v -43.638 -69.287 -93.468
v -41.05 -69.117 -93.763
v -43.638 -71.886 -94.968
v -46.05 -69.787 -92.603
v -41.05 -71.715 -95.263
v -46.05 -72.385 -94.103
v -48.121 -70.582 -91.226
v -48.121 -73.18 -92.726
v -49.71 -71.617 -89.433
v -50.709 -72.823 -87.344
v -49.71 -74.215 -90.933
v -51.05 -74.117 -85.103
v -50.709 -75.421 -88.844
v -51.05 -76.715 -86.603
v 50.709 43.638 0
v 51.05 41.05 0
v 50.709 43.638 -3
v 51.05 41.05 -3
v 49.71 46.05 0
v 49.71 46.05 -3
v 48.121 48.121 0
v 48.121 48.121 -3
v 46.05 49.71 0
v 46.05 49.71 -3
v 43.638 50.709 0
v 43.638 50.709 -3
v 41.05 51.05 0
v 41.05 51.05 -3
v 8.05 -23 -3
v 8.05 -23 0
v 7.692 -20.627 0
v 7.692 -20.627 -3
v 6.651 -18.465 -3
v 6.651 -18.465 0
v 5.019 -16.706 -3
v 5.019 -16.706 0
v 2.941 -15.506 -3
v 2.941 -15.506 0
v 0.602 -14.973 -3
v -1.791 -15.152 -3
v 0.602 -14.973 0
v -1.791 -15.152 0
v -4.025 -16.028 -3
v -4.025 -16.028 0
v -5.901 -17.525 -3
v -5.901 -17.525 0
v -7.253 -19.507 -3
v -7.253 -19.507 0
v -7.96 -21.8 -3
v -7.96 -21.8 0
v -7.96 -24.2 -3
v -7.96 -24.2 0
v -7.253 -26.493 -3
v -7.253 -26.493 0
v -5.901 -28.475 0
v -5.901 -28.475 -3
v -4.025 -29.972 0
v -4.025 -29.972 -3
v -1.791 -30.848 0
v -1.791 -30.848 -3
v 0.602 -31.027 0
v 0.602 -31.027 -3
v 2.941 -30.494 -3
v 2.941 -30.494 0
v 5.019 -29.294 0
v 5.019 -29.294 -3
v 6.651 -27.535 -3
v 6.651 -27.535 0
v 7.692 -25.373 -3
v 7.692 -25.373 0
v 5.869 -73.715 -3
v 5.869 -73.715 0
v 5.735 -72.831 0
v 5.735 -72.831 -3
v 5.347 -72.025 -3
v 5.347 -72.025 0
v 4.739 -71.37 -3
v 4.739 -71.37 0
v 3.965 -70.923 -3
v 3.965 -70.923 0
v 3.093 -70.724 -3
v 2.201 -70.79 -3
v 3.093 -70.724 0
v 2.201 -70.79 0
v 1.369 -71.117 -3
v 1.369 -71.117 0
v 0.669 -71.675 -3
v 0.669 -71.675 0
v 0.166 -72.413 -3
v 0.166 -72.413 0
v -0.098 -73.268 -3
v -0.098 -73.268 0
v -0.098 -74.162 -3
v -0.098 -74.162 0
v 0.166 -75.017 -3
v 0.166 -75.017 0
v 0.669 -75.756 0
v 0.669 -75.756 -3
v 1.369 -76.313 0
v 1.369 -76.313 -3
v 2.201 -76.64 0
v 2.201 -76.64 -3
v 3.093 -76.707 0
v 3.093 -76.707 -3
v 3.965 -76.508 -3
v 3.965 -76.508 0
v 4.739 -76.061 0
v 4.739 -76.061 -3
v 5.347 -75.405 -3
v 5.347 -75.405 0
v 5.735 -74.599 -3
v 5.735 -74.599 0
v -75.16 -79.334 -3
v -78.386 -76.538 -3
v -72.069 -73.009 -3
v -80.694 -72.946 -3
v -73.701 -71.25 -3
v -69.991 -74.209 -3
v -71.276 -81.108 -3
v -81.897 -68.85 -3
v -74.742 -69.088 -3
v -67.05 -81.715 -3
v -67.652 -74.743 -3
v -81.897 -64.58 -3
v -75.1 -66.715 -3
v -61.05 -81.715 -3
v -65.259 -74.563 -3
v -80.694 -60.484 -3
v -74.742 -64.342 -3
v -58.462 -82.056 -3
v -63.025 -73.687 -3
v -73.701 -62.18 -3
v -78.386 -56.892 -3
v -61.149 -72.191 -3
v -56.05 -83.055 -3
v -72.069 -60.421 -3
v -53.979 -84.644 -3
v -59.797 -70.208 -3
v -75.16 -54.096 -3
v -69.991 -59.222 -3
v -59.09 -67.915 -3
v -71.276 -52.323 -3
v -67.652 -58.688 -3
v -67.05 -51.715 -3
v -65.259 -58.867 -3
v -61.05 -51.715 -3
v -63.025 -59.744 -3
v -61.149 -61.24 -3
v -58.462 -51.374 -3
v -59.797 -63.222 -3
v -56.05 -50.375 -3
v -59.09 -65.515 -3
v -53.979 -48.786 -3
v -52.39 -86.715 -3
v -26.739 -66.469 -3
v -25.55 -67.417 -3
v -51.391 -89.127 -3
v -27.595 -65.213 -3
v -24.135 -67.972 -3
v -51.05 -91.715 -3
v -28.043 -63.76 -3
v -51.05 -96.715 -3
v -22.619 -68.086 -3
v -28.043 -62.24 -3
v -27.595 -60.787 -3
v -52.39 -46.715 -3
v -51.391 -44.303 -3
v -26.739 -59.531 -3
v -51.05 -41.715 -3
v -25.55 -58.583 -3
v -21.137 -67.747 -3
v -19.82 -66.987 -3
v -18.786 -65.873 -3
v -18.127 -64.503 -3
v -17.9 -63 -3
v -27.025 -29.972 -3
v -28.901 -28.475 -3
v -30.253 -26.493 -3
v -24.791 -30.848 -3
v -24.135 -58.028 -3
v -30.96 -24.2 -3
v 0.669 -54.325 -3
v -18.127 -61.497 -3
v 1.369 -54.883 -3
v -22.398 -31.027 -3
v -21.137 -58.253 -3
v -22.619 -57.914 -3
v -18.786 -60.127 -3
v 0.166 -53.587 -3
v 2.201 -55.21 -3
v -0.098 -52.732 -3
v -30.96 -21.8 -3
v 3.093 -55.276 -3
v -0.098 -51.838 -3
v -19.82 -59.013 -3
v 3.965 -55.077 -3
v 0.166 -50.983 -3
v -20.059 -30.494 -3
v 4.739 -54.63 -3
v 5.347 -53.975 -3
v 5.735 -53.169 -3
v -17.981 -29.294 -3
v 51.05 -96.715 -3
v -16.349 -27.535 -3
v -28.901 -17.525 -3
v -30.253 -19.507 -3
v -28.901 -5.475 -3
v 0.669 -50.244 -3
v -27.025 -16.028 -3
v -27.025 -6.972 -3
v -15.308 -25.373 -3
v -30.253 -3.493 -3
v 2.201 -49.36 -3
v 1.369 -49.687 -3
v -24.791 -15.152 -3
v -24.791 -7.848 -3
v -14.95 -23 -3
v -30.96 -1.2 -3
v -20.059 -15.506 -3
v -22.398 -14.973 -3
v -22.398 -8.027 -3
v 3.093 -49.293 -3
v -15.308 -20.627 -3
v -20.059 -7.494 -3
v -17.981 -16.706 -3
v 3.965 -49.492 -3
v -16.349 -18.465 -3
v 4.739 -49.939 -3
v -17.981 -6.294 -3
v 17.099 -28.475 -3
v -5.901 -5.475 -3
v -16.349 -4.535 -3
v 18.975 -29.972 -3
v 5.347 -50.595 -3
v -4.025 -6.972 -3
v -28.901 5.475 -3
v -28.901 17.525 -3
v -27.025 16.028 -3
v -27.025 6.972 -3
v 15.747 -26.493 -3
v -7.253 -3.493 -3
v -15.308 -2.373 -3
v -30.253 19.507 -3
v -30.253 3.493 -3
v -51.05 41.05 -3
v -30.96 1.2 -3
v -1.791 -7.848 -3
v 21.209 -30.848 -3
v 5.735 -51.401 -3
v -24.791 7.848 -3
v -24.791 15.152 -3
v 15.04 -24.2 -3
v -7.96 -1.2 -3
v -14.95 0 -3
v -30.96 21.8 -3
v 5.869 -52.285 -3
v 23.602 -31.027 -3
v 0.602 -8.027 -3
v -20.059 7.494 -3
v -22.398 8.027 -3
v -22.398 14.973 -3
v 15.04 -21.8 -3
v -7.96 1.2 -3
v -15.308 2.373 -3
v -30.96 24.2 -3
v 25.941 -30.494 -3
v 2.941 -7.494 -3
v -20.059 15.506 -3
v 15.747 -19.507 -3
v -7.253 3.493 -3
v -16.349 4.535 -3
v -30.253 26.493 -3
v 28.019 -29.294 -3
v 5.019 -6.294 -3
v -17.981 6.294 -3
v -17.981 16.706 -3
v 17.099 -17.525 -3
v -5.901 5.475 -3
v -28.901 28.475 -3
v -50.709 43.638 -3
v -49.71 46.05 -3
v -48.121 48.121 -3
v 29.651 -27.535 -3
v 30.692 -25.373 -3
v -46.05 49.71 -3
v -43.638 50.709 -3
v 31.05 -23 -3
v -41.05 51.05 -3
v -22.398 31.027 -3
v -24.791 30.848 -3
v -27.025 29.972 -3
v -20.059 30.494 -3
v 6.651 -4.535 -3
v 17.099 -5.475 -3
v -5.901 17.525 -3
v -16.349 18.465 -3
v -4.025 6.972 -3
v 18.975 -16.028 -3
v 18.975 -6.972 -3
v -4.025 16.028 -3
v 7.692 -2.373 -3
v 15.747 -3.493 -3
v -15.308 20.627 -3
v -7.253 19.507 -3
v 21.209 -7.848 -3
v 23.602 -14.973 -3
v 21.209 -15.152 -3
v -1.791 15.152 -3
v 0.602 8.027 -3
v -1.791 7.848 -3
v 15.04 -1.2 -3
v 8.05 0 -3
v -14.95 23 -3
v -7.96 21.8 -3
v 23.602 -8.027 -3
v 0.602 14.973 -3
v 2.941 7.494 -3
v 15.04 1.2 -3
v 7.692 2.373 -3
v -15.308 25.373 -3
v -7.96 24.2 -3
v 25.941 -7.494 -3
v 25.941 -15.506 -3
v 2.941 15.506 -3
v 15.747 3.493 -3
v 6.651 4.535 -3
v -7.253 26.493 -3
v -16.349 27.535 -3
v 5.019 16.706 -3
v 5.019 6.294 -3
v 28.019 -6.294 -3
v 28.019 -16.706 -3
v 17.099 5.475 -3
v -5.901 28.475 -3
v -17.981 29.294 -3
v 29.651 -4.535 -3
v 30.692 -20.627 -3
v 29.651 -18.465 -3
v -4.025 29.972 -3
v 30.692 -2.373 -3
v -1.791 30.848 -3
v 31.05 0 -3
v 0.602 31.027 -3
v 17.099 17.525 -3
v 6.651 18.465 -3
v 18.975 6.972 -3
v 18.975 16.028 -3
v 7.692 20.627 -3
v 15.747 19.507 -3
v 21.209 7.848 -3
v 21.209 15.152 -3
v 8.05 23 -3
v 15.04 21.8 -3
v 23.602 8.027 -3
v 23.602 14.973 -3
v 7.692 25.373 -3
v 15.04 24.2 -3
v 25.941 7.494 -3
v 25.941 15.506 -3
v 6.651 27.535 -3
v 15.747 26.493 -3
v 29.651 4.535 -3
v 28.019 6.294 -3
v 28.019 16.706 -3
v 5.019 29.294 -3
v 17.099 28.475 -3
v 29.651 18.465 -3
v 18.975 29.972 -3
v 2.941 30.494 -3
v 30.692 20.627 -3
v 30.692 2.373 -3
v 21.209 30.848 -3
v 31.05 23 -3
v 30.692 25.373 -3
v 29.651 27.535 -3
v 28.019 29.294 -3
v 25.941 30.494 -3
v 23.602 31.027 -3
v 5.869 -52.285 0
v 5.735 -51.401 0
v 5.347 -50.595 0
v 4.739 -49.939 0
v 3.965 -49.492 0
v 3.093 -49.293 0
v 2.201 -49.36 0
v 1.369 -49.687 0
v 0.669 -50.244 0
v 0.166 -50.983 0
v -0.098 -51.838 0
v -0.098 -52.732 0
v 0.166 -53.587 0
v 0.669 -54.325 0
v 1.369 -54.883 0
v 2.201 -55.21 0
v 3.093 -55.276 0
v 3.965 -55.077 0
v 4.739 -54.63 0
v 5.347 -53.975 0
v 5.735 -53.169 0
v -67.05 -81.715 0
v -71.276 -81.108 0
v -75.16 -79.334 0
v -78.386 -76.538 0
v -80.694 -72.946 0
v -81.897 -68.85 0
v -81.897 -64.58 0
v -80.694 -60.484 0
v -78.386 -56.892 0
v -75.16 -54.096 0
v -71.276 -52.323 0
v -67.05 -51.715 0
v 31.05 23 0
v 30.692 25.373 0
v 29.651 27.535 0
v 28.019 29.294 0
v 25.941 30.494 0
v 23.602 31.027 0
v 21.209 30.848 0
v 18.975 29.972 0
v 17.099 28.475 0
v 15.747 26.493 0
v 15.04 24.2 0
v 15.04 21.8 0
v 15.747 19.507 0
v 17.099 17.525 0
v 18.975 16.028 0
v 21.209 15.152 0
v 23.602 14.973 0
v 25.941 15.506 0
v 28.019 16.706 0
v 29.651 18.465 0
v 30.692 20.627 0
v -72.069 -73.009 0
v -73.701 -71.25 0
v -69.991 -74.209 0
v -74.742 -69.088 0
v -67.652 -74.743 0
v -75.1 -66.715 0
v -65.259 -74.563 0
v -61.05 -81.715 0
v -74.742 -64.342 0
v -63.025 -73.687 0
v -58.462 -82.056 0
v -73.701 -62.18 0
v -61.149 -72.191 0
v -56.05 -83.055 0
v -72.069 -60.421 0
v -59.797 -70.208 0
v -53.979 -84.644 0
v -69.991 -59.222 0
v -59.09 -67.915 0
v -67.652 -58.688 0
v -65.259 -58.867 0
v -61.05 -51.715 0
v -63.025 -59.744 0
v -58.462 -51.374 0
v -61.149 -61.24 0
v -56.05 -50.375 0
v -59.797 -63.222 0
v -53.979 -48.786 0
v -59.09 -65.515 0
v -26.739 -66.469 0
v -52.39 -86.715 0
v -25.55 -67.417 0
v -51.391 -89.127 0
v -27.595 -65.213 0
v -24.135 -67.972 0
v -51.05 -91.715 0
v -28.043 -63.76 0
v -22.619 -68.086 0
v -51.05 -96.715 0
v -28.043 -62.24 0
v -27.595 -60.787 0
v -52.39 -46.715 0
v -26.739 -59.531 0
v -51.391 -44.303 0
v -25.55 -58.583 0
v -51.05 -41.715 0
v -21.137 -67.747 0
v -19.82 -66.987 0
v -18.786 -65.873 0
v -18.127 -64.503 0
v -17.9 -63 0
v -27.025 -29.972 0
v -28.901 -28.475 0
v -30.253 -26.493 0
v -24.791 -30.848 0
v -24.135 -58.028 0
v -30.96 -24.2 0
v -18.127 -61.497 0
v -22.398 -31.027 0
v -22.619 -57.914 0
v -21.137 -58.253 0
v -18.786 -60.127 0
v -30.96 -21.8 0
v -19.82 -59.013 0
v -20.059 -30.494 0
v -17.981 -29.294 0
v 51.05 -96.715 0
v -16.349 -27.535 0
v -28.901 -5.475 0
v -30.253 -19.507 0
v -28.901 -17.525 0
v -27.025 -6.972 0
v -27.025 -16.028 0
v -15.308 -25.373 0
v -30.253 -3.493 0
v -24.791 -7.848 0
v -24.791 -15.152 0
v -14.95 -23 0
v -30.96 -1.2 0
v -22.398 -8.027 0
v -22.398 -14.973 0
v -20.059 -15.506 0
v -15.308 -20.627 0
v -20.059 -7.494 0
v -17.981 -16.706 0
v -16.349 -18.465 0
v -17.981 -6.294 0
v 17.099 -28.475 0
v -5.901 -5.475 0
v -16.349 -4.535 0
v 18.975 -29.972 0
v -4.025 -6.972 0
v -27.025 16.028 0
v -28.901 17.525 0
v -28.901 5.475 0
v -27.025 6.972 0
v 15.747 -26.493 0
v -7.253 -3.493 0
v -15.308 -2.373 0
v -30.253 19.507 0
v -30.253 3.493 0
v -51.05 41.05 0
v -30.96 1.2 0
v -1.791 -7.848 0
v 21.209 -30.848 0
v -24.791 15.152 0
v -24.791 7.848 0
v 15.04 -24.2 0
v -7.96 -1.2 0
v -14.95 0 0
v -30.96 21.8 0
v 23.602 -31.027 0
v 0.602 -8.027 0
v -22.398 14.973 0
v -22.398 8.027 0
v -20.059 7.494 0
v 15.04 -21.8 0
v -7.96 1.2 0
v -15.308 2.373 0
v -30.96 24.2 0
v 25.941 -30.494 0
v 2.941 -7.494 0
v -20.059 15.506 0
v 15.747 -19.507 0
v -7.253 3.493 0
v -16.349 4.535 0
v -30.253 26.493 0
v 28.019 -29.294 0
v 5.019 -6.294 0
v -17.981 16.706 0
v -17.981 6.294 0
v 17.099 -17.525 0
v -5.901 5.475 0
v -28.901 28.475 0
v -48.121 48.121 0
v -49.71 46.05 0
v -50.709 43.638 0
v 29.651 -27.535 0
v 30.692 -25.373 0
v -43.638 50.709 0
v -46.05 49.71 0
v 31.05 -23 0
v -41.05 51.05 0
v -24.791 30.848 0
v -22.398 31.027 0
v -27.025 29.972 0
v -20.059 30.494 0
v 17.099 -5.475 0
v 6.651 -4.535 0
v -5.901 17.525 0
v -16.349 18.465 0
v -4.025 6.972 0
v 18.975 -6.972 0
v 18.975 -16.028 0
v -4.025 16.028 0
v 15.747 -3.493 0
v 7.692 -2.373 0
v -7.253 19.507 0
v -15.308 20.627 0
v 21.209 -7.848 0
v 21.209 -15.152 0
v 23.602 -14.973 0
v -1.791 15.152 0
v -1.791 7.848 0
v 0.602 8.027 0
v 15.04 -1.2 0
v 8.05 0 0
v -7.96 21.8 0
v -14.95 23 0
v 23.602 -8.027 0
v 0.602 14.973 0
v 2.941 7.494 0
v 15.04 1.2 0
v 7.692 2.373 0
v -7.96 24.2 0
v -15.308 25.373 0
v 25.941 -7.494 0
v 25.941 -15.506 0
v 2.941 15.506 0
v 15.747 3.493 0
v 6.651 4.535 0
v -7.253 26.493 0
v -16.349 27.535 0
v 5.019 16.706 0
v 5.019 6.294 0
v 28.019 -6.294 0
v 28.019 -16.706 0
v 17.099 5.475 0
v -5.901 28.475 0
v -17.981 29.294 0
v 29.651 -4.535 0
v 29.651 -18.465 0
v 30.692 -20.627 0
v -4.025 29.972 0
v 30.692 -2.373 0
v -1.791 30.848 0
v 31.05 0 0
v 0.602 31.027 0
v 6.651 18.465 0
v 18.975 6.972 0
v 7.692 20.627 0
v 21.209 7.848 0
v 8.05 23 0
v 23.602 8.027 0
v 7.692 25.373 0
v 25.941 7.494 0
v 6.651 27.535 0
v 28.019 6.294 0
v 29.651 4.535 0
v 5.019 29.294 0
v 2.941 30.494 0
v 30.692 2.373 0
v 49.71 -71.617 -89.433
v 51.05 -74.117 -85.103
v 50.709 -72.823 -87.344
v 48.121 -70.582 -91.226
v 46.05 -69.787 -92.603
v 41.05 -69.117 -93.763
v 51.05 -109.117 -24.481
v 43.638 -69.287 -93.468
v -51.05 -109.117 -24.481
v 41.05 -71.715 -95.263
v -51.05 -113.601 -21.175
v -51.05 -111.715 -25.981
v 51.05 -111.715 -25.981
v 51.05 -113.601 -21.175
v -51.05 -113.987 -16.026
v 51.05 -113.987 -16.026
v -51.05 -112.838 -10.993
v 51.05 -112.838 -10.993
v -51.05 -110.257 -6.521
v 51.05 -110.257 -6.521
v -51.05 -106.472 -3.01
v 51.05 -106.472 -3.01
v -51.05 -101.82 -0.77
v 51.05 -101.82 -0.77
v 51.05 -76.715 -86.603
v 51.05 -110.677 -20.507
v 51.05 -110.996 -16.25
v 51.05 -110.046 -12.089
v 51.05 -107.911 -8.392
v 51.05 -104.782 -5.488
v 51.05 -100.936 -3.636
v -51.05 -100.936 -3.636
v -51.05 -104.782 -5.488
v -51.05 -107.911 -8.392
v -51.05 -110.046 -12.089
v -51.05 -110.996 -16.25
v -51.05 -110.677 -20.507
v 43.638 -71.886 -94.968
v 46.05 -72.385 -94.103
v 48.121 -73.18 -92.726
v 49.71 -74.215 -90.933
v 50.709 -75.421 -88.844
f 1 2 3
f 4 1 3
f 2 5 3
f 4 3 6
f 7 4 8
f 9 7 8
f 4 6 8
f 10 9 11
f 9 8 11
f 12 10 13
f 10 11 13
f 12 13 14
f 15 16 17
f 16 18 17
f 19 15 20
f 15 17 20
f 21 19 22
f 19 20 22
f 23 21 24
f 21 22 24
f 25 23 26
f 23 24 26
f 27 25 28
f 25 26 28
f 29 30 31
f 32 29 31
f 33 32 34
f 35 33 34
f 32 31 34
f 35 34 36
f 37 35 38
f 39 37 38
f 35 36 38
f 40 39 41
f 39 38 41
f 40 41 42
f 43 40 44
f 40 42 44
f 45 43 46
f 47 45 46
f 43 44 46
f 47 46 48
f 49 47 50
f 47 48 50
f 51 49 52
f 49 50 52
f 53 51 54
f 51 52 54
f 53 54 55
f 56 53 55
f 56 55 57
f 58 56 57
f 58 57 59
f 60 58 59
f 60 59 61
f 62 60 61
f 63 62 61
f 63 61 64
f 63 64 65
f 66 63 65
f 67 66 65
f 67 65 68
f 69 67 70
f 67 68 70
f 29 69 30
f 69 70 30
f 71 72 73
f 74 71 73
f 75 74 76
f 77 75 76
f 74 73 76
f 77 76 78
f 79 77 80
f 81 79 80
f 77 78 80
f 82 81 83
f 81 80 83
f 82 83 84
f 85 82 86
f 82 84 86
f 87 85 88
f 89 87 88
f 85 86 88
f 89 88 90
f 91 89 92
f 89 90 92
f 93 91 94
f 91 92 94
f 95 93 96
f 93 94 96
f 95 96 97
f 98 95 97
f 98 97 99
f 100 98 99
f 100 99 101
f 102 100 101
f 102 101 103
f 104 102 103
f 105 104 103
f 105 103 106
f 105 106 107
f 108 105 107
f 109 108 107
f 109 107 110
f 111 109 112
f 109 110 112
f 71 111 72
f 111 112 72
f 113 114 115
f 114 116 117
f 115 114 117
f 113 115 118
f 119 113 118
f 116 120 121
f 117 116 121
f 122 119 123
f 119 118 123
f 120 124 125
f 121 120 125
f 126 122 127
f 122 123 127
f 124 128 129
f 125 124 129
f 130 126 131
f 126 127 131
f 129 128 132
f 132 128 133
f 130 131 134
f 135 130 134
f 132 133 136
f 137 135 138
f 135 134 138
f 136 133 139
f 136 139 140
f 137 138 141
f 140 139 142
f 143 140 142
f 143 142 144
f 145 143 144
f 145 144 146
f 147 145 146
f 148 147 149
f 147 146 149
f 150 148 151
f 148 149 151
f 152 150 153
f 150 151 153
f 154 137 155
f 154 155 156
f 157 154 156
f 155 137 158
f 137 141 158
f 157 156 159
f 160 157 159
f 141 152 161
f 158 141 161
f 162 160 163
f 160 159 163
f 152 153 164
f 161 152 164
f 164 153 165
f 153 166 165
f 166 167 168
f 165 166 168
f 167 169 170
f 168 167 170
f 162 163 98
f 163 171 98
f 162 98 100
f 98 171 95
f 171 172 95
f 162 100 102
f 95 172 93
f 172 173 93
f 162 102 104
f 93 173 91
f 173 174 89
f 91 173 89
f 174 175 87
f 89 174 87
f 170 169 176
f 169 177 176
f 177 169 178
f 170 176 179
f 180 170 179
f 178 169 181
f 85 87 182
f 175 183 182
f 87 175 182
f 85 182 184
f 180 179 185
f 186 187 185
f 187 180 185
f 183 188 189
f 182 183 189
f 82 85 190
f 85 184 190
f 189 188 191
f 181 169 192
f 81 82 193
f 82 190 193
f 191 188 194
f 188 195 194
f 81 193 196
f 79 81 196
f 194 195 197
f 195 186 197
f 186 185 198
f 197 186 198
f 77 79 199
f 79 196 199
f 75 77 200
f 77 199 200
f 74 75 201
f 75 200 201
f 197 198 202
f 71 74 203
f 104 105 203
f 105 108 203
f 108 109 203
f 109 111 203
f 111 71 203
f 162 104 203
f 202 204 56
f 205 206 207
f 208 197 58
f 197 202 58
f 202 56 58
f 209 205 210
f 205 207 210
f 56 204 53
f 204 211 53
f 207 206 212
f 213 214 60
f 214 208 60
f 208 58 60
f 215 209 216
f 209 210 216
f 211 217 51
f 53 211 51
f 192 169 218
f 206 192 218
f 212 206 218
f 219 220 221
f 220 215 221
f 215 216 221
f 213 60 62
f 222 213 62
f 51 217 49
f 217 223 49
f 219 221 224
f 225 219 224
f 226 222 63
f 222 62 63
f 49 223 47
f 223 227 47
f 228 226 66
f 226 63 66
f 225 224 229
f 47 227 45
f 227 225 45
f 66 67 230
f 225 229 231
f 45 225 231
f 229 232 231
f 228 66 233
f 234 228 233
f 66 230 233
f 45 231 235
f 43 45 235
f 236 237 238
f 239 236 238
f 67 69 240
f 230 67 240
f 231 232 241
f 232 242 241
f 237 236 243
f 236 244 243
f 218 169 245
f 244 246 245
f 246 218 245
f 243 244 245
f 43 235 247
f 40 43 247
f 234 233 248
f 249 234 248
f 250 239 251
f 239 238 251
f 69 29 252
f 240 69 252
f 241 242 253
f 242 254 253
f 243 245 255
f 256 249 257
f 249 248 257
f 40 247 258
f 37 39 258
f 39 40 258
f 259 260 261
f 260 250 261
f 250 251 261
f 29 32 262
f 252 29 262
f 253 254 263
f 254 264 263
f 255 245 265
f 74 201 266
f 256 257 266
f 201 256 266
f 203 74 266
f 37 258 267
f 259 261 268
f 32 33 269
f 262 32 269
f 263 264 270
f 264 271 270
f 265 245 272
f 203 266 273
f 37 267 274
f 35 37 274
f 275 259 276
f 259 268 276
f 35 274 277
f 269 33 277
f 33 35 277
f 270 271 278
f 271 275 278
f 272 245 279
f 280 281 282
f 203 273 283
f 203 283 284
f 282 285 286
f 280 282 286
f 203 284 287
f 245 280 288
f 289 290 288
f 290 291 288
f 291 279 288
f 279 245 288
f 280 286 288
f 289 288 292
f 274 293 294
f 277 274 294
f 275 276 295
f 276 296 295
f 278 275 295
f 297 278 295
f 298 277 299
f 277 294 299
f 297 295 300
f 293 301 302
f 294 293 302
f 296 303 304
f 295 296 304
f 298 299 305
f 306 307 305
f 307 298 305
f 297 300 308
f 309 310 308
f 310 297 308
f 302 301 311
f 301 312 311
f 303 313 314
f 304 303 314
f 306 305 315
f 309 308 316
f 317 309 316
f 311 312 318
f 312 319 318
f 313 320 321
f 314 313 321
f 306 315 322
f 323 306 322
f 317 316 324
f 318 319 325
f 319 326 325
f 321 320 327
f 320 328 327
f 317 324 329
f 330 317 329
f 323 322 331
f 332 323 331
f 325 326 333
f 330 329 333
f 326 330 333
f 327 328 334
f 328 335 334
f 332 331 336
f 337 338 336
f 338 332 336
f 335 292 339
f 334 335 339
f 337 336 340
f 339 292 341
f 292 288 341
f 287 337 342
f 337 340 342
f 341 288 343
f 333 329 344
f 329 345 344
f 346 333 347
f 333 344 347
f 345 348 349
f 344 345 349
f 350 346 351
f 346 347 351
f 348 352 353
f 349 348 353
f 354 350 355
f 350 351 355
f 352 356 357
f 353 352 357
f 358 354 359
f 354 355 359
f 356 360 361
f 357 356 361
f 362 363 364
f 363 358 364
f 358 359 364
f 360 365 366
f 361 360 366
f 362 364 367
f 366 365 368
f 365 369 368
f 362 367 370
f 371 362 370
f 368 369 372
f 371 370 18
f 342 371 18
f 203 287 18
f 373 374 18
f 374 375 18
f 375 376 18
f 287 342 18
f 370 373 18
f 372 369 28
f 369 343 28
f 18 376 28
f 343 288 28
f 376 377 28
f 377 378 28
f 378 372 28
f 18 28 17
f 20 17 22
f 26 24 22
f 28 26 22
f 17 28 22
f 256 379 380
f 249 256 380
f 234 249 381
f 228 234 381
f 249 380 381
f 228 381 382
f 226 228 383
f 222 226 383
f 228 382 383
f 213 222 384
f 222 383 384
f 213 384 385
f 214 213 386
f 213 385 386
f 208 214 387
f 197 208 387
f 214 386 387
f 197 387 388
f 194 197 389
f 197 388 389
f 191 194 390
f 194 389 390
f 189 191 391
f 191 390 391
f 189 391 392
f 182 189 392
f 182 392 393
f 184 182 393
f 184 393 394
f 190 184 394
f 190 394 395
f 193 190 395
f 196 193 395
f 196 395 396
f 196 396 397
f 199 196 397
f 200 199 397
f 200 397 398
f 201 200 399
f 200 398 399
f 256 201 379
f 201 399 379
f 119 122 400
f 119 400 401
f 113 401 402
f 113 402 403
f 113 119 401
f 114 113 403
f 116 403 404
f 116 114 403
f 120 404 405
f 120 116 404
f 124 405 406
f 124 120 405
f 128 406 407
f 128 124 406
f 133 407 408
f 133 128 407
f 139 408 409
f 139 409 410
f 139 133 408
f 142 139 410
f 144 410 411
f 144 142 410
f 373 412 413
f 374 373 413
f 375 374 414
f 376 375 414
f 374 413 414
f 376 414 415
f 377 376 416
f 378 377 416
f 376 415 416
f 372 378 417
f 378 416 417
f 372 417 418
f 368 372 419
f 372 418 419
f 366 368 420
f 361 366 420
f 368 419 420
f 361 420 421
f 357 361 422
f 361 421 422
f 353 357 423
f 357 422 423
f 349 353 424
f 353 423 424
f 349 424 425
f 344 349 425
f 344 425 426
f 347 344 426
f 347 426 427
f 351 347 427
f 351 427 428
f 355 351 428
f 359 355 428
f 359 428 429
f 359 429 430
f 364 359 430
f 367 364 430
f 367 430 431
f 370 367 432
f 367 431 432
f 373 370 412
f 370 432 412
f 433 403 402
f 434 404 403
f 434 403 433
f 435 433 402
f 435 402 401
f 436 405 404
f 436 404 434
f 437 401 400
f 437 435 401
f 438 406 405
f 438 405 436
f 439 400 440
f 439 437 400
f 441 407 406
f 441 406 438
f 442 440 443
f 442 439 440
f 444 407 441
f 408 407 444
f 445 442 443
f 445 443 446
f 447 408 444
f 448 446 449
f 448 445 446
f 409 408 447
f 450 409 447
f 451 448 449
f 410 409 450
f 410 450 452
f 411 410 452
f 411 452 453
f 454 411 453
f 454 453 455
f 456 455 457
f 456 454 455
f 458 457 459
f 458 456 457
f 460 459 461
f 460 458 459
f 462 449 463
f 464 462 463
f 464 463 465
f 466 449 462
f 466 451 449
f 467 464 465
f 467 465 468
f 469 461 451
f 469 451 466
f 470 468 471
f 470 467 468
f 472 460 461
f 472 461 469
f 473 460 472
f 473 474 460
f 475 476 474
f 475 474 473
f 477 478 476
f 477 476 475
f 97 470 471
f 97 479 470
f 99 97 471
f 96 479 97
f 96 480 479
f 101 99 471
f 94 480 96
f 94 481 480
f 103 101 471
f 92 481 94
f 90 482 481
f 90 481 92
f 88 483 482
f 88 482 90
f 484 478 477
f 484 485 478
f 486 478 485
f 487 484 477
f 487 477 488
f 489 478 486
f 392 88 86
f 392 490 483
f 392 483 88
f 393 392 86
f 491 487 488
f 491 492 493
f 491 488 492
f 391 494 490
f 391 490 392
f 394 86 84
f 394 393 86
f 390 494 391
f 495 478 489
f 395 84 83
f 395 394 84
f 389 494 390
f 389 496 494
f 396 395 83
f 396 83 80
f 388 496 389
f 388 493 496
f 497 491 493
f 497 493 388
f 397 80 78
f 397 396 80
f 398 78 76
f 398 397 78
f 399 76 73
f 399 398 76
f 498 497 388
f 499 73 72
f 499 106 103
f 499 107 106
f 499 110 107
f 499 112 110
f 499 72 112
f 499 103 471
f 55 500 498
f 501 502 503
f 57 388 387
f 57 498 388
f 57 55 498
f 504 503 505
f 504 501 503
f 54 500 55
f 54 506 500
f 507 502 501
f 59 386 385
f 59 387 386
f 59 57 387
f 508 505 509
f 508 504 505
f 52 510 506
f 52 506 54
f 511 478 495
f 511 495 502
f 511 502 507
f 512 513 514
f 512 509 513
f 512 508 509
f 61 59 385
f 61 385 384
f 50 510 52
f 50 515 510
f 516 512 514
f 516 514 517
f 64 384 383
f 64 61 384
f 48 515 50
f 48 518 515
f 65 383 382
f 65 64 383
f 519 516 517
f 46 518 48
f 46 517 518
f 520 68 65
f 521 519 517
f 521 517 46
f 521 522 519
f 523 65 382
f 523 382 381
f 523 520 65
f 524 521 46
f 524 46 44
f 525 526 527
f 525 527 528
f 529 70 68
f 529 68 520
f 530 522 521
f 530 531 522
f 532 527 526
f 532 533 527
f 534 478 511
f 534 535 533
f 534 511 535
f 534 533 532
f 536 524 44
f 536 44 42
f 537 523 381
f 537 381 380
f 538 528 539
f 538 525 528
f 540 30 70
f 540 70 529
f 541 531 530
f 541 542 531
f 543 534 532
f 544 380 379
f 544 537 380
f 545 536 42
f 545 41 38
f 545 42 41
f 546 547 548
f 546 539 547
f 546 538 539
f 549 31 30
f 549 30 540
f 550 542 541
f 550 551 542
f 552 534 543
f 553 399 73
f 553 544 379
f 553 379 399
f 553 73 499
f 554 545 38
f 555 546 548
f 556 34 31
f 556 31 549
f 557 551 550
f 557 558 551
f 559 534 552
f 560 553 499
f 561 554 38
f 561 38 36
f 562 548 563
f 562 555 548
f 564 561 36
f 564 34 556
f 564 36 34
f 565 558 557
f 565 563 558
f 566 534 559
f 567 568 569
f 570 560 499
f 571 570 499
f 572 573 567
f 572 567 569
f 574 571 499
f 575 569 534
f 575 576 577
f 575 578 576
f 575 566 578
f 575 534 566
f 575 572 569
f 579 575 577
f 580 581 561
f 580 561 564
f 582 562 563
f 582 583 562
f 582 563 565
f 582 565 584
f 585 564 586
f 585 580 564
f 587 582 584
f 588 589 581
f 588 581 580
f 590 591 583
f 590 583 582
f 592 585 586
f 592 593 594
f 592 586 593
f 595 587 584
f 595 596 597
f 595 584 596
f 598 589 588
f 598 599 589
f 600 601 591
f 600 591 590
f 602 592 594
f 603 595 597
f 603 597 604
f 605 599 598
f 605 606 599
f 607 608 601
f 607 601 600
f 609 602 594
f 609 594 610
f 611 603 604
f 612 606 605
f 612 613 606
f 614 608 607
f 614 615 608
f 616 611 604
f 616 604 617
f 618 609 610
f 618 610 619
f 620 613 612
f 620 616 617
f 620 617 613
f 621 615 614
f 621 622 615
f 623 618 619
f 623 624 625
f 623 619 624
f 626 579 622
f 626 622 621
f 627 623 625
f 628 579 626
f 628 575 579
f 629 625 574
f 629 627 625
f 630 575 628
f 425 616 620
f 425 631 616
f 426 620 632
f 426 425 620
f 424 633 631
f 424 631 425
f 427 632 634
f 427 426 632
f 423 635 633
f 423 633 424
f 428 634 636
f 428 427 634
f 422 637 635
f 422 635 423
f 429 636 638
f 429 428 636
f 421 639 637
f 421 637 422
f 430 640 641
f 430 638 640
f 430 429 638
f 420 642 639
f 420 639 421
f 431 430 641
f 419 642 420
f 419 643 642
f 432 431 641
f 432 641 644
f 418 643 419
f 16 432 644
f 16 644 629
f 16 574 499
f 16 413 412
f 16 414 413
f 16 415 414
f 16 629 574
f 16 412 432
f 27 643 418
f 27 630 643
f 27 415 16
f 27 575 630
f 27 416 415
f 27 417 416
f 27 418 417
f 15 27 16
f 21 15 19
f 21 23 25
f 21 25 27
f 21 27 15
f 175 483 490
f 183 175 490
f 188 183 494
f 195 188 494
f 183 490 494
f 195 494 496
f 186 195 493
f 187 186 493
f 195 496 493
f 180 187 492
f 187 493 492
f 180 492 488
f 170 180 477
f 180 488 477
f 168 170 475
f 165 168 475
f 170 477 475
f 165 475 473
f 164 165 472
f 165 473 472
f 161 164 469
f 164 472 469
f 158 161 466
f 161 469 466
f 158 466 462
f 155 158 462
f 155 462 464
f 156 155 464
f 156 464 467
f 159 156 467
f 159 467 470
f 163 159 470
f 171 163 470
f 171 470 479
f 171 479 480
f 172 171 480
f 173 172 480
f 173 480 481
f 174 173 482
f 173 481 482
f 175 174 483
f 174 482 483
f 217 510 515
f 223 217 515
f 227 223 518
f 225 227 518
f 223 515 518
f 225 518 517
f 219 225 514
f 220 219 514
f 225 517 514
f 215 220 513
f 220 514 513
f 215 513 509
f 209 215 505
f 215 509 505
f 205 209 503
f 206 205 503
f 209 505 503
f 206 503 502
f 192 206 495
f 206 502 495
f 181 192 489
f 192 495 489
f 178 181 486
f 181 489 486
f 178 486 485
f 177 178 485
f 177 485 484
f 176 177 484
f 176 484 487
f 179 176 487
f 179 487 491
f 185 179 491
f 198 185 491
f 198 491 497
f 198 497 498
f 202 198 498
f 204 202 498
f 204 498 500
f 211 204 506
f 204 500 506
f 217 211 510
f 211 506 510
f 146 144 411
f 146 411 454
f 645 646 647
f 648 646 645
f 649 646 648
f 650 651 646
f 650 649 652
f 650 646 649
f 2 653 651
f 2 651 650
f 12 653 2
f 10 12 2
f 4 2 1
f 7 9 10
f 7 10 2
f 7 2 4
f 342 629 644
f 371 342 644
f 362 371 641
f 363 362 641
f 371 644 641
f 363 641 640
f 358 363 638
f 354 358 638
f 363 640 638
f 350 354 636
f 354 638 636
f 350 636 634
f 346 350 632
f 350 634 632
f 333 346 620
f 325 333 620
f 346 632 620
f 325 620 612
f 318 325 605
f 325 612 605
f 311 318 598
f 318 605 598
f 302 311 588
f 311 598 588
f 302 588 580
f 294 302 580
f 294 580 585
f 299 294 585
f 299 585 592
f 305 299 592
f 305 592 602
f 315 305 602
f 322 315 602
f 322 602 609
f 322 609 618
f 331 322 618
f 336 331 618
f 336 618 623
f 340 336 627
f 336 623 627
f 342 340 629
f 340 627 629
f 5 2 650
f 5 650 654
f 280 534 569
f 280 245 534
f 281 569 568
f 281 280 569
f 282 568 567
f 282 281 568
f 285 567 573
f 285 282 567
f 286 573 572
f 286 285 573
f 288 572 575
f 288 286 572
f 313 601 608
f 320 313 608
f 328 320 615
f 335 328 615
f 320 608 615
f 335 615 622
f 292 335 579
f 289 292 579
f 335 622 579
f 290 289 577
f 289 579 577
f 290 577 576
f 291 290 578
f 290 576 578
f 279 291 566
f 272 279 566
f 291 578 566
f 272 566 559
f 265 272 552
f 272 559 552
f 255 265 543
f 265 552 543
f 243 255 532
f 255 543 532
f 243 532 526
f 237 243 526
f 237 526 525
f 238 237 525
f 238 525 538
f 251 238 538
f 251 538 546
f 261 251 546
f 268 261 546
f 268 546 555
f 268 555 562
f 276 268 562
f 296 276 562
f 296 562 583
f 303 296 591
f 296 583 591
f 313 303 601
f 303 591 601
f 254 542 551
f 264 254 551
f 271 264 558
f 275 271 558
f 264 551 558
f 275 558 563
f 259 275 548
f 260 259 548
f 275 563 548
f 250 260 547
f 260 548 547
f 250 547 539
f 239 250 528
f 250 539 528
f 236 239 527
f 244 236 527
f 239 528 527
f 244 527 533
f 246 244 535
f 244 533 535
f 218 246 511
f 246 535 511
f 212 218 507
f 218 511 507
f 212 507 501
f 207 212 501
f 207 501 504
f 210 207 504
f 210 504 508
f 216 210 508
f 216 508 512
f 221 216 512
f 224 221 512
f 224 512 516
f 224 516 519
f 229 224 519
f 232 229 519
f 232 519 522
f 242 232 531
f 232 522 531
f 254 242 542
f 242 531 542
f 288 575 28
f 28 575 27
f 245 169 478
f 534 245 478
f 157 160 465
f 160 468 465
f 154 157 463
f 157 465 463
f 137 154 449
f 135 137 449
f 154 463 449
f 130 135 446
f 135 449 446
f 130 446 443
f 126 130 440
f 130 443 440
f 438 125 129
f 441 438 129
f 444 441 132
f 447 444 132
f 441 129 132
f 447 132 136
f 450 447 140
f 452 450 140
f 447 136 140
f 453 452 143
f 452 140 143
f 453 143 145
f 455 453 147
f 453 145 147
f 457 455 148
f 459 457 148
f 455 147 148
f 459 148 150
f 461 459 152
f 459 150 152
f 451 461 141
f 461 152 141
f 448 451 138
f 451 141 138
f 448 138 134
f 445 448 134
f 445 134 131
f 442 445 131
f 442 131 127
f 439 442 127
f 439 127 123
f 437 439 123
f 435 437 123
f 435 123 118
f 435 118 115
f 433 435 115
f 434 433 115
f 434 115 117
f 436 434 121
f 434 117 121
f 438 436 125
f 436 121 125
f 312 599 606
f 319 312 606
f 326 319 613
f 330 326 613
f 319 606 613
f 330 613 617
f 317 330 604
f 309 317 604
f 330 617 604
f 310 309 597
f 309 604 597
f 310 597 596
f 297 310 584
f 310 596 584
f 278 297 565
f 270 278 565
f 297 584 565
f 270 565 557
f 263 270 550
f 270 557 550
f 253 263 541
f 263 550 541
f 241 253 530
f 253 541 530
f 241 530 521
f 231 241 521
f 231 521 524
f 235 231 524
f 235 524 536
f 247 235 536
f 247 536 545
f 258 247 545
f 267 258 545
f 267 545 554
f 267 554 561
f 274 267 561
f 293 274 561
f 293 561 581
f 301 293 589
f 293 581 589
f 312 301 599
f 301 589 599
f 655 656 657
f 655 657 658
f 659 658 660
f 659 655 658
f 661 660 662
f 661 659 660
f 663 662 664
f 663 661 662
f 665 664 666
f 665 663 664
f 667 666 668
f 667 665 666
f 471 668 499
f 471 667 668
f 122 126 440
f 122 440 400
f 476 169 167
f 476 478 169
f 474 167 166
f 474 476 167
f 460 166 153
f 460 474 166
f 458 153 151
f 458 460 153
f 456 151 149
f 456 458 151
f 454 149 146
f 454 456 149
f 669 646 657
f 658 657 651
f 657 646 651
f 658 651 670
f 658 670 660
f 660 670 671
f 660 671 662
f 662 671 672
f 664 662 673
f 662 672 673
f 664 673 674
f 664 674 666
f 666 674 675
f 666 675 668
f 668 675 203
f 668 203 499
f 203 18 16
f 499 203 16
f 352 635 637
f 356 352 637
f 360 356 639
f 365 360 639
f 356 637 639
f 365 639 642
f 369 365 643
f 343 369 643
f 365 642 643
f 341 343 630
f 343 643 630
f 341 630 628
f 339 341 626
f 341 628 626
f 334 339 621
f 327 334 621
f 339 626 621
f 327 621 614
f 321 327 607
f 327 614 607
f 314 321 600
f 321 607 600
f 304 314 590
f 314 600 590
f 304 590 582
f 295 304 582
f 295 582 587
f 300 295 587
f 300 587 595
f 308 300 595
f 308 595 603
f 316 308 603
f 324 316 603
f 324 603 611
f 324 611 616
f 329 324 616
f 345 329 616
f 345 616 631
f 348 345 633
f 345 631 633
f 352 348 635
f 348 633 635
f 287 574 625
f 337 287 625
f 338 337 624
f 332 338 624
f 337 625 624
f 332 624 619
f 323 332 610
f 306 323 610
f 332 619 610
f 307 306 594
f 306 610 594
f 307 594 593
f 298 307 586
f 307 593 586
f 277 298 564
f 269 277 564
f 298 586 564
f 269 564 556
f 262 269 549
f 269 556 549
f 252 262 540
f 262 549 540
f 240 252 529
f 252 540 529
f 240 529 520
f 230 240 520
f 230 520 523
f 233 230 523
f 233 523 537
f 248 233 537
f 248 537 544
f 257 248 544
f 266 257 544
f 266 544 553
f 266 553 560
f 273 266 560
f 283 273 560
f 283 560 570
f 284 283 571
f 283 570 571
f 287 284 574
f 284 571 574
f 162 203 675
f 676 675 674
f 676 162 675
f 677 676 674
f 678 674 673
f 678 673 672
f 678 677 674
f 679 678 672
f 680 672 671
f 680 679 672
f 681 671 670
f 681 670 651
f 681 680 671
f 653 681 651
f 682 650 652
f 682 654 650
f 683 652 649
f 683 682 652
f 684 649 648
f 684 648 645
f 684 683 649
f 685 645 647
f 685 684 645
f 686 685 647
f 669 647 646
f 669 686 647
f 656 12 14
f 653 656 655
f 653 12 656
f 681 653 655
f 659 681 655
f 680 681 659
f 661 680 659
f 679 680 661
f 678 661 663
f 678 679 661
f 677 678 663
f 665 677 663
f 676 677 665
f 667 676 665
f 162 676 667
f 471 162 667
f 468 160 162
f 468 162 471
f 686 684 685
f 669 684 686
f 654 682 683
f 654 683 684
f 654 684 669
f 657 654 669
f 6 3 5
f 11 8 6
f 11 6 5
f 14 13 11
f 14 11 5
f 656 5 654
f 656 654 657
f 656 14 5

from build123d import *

# Parameters (mm, degrees)
SKETCH1_W           = 102.1
SKETCH1_H           = 147.765136106
SKETCH1_R           = 5.1
SKETCH1_R_2         = 3
SKETCH1_R_3         = 8.05
BOSS_EXTRUDE1_DEPTH = 3
BOSS_EXTRUDE2_DEPTH = 102.1
FILLET1_R           = 10
SKETCH3_R           = 8.05
BOSS_EXTRUDE3_DEPTH = 3
FILLET2_R           = 10


with BuildPart() as part:
    # Sketch1 → Boss-Extrude1 (new body)
    with BuildSketch(Plane.XY):
        with Locations((0, -22.832568053)):
            Rectangle(SKETCH1_W, SKETCH1_H)
        with Locations((-23, -63)):
            Circle(SKETCH1_R, mode=Mode.SUBTRACT)
        with Locations((2.86862691, -73.715136106)):
            Circle(SKETCH1_R_2, mode=Mode.SUBTRACT)
        with Locations((23, 23)):
            Circle(SKETCH1_R_3, mode=Mode.SUBTRACT)
        with Locations((0, -23)):
            Circle(SKETCH1_R_3, mode=Mode.SUBTRACT)
        with Locations((-23, -23)):
            Circle(SKETCH1_R_3, mode=Mode.SUBTRACT)
        Circle(SKETCH1_R_3, mode=Mode.SUBTRACT)
        with Locations((-23, 0)):
            Circle(SKETCH1_R_3, mode=Mode.SUBTRACT)
        with Locations((23, -23)):
            Circle(SKETCH1_R_3, mode=Mode.SUBTRACT)
        with Locations((23, 0)):
            Circle(SKETCH1_R_3, mode=Mode.SUBTRACT)
        with Locations((2.86862691, -52.284863894)):
            Circle(SKETCH1_R_2, mode=Mode.SUBTRACT)
        with Locations((0, 23)):
            Circle(SKETCH1_R_3, mode=Mode.SUBTRACT)
        with Locations((-23, 23)):
            Circle(SKETCH1_R_3, mode=Mode.SUBTRACT)
    extrude(amount=-BOSS_EXTRUDE1_DEPTH)

    # Sketch2 → Boss-Extrude2 (add)
    with BuildSketch(Plane.ZY.offset(51.05)):
        with BuildLine():
            Line((-24.480762114, -109.117059895), (-93.762794416, -69.117059895))
            Line((-93.762794416, -69.117059895), (-95.262794416, -71.715136106))
            Line((-95.262794416, -71.715136106), (-25.980762114, -111.715136106))
            ThreePointArc((-25.980762114, -111.715136106), (-8.660254038, -111.715136106), (0, -96.715136106))
            Line((0, -96.715136106), (-3, -96.715136106))
            ThreePointArc((-3, -96.715136106), (-10.160254038, -109.117059895), (-24.480762114, -109.117059895))
        make_face()
    extrude(amount=-BOSS_EXTRUDE2_DEPTH)

    # Fillet1
    fillet1_edges = [part.edges().sort_by_distance(p)[0] for p in [
        (51.05, 51.05, -1.5),
        (-51.05, 51.05, -1.5),
        (-51.05, -70.416098001, -94.512794416),
        (51.05, -70.416098001, -94.512794416),
    ]]
    fillet(fillet1_edges, radius=FILLET1_R)

    # Sketch3 → Boss-Extrude3 (add)
    with BuildSketch(Plane(origin=(0, 0, -3), x_dir=(-1, 0, 0), z_dir=(0, 0, -1))):
        with BuildLine():
            ThreePointArc((67.05, -81.715136106), (82.05, -66.715136106), (67.05, -51.715136106))
            Line((67.05, -51.715136106), (51.05, -51.715136106))
            Line((51.05, -51.715136106), (51.05, -81.715136106))
            Line((51.05, -81.715136106), (67.05, -81.715136106))
        make_face()
        with Locations((67.05, -66.715136106)):
            Circle(SKETCH3_R, mode=Mode.SUBTRACT)
    extrude(amount=-BOSS_EXTRUDE3_DEPTH)

    # Fillet2
    fillet2_edges = [part.edges().sort_by_distance(p)[0] for p in [
        (-51.05, -51.715136106, -1.5),
        (-51.05, -81.715136106, -1.5),
    ]]
    fillet(fillet2_edges, radius=FILLET2_R)


solid = part.part
